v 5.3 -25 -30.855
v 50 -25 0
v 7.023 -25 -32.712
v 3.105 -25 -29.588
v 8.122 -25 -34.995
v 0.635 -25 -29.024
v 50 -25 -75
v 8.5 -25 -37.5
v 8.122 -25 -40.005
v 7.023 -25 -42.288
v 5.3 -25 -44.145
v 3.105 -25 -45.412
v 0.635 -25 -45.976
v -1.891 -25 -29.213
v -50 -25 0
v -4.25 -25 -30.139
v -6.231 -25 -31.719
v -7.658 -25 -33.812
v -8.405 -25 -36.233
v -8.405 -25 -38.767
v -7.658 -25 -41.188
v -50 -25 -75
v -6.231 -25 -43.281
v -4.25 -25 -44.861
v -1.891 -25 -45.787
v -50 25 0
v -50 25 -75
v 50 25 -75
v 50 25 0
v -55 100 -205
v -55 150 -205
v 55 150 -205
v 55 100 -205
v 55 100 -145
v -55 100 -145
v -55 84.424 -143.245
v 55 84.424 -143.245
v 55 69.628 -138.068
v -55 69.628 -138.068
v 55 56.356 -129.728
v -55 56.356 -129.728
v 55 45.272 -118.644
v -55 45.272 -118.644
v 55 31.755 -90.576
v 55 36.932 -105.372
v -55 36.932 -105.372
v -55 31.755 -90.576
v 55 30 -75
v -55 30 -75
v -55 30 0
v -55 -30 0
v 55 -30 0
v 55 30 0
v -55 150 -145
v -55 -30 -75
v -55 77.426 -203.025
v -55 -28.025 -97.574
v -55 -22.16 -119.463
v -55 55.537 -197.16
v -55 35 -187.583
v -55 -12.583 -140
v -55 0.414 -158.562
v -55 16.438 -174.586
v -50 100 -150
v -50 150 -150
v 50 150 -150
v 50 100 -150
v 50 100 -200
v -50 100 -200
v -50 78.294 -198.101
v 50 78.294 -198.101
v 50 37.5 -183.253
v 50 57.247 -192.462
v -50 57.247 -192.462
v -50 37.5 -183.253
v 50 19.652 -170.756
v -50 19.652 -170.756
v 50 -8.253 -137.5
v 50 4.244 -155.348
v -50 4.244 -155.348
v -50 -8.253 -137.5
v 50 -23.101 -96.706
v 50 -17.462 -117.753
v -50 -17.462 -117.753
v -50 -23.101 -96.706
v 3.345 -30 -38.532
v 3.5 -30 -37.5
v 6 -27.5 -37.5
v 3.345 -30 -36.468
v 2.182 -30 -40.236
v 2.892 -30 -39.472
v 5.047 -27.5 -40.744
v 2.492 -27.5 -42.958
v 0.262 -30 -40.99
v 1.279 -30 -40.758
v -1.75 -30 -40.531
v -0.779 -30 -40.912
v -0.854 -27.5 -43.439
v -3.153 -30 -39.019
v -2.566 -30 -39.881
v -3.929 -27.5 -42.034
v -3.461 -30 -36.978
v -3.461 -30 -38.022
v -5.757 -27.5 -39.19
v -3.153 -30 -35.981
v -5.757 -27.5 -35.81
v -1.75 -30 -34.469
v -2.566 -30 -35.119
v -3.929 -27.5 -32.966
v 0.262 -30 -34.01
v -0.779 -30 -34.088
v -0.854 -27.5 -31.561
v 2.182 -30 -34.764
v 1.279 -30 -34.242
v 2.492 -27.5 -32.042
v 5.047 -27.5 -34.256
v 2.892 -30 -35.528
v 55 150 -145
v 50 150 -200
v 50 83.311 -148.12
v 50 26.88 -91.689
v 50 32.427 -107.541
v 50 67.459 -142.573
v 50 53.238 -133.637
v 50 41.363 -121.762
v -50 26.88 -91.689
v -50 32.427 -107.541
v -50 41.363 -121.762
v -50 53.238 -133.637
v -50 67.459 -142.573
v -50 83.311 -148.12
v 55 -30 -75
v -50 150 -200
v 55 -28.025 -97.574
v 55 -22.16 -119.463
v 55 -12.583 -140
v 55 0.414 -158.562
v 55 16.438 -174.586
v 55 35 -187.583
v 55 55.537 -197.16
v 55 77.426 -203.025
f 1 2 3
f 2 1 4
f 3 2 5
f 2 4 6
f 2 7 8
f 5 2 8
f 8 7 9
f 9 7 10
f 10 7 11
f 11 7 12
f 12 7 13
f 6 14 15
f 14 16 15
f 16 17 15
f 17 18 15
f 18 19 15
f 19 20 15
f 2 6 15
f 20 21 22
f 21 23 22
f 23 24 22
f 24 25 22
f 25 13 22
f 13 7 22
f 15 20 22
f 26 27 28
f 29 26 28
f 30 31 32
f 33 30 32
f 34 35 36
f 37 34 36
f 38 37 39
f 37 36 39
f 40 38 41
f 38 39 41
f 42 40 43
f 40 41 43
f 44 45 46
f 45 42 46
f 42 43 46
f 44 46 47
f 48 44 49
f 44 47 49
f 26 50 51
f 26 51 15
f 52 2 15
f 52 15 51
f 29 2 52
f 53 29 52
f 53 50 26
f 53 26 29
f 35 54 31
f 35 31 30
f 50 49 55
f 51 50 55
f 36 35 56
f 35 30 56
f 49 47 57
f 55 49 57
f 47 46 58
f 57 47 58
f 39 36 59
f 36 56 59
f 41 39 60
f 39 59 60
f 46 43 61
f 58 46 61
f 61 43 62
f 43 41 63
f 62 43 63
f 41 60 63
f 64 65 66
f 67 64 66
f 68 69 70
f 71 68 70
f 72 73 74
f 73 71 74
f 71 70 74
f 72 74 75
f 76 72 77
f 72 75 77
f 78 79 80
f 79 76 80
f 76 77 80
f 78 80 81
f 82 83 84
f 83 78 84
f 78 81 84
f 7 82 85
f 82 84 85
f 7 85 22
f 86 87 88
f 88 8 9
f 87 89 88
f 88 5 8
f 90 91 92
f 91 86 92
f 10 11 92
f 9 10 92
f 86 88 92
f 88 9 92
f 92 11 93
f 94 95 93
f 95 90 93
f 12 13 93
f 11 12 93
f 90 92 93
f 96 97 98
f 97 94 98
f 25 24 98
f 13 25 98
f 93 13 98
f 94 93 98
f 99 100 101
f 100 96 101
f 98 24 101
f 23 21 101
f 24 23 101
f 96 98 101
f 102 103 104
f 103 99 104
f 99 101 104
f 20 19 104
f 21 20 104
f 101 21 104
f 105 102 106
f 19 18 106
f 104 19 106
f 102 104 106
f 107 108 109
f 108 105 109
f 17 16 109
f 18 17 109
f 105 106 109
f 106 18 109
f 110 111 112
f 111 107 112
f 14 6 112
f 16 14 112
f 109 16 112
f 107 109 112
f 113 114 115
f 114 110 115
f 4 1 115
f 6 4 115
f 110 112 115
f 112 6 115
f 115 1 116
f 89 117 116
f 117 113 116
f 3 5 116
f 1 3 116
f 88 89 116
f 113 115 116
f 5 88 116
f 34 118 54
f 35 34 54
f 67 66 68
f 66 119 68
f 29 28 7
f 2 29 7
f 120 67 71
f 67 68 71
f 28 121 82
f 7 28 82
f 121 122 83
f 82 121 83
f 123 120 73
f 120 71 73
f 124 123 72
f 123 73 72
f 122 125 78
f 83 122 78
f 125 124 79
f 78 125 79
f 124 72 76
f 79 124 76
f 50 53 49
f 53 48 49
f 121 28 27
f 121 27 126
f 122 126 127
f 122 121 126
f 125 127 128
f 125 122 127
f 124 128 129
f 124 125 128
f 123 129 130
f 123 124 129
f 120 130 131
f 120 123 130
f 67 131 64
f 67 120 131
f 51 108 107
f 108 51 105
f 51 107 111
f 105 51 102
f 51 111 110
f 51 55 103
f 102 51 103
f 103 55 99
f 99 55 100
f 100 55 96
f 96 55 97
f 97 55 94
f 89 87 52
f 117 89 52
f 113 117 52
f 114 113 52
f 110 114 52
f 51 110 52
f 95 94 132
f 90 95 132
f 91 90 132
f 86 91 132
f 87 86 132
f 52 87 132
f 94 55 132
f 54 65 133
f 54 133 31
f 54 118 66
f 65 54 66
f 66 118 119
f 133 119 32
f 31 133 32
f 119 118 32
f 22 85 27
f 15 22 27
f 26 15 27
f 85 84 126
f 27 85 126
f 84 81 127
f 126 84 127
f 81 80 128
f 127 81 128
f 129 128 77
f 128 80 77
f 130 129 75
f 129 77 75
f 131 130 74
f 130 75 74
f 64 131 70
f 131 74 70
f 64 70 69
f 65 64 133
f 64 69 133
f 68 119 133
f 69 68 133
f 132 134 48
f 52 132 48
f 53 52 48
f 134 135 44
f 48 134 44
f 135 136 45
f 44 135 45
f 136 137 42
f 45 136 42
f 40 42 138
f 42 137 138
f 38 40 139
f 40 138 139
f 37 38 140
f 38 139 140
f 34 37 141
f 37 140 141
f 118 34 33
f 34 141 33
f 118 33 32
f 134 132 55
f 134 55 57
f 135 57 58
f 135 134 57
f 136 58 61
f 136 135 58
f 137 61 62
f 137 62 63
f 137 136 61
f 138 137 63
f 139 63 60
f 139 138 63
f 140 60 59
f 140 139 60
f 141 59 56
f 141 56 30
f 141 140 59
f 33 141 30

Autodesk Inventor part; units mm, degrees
ref_plane "YZ Plane" through (0, 0, 0) normal (1, 0, 0) x (0, 1, 0)
ref_plane "XZ Plane" through (0, 0, 0) normal (0, 1, 0) x (-1, 0, 0)
ref_plane "XY Plane" through (0, 0, 0) normal (0, 0, 1) x (1, 0, 0)
sketch "Sketch1" plane through (0, 0, 0) normal (0, 0, 1) x (1, 0, 0)
  point P0 (0, 0)
sketch "Sketch2" plane through (0, 0, 0) normal (0, 0, 1) x (1, 0, 0)
  line L0 (-50, -25) -> (50, -25)
  line L1 (50, -25) -> (50, 25)
  line L2 (50, 25) -> (-50, 25)
  line L3 (-50, 25) -> (-50, -25)
  line L4 (-50, -25) -> (50, 25) construction
  line L5 (50, -25) -> (-50, 25) construction
  line L6 (-55, -30) -> (55, -30)
  line L7 (55, -30) -> (55, 30)
  line L8 (55, 30) -> (-55, 30)
  line L9 (-55, 30) -> (-55, -30)
  line L10 (-55, -30) -> (55, 30) construction
  line L11 (55, -30) -> (-55, 30) construction
  point P0 (0, 0)
  dimension "d0" = 100
  dimension "d1" = 50
  dimension "d2" = 110
  dimension "d3" = 60
sketch "Sketch3" plane through (0, 0, 0) normal (1, 0, 0) x (0, 1, 0)
  line L0 (0, 0) -> (0, -75)
  arc A0 (0, -75) -> (100, -175) centre (100, -75) ccw
  line L1 (100, -75) -> (100, -175) construction
  line L2 (100, -75) -> (0, -75) construction
  line L3 (100, -175) -> (150, -175)
sweep "Sweep1" add profiles "Sketch2" path "Sketch3"
sketch "Sketch4" plane through (-55, -30, 0) normal (0, -1, 0) x (1, 0, 0)
  circle A0 centre (55, -37.5) radius 3.5
  point P0 (55, 0)
  dimension "d9" = 7
extrude "Extrusion1" cut sketch "Sketch4" against normal blind 10
chamfer "Chamfer1" distance 5 angle 45 1 edges at (-3.5, -25, -37.5)
properties part number "RecTubeNewTappingChamfer"
